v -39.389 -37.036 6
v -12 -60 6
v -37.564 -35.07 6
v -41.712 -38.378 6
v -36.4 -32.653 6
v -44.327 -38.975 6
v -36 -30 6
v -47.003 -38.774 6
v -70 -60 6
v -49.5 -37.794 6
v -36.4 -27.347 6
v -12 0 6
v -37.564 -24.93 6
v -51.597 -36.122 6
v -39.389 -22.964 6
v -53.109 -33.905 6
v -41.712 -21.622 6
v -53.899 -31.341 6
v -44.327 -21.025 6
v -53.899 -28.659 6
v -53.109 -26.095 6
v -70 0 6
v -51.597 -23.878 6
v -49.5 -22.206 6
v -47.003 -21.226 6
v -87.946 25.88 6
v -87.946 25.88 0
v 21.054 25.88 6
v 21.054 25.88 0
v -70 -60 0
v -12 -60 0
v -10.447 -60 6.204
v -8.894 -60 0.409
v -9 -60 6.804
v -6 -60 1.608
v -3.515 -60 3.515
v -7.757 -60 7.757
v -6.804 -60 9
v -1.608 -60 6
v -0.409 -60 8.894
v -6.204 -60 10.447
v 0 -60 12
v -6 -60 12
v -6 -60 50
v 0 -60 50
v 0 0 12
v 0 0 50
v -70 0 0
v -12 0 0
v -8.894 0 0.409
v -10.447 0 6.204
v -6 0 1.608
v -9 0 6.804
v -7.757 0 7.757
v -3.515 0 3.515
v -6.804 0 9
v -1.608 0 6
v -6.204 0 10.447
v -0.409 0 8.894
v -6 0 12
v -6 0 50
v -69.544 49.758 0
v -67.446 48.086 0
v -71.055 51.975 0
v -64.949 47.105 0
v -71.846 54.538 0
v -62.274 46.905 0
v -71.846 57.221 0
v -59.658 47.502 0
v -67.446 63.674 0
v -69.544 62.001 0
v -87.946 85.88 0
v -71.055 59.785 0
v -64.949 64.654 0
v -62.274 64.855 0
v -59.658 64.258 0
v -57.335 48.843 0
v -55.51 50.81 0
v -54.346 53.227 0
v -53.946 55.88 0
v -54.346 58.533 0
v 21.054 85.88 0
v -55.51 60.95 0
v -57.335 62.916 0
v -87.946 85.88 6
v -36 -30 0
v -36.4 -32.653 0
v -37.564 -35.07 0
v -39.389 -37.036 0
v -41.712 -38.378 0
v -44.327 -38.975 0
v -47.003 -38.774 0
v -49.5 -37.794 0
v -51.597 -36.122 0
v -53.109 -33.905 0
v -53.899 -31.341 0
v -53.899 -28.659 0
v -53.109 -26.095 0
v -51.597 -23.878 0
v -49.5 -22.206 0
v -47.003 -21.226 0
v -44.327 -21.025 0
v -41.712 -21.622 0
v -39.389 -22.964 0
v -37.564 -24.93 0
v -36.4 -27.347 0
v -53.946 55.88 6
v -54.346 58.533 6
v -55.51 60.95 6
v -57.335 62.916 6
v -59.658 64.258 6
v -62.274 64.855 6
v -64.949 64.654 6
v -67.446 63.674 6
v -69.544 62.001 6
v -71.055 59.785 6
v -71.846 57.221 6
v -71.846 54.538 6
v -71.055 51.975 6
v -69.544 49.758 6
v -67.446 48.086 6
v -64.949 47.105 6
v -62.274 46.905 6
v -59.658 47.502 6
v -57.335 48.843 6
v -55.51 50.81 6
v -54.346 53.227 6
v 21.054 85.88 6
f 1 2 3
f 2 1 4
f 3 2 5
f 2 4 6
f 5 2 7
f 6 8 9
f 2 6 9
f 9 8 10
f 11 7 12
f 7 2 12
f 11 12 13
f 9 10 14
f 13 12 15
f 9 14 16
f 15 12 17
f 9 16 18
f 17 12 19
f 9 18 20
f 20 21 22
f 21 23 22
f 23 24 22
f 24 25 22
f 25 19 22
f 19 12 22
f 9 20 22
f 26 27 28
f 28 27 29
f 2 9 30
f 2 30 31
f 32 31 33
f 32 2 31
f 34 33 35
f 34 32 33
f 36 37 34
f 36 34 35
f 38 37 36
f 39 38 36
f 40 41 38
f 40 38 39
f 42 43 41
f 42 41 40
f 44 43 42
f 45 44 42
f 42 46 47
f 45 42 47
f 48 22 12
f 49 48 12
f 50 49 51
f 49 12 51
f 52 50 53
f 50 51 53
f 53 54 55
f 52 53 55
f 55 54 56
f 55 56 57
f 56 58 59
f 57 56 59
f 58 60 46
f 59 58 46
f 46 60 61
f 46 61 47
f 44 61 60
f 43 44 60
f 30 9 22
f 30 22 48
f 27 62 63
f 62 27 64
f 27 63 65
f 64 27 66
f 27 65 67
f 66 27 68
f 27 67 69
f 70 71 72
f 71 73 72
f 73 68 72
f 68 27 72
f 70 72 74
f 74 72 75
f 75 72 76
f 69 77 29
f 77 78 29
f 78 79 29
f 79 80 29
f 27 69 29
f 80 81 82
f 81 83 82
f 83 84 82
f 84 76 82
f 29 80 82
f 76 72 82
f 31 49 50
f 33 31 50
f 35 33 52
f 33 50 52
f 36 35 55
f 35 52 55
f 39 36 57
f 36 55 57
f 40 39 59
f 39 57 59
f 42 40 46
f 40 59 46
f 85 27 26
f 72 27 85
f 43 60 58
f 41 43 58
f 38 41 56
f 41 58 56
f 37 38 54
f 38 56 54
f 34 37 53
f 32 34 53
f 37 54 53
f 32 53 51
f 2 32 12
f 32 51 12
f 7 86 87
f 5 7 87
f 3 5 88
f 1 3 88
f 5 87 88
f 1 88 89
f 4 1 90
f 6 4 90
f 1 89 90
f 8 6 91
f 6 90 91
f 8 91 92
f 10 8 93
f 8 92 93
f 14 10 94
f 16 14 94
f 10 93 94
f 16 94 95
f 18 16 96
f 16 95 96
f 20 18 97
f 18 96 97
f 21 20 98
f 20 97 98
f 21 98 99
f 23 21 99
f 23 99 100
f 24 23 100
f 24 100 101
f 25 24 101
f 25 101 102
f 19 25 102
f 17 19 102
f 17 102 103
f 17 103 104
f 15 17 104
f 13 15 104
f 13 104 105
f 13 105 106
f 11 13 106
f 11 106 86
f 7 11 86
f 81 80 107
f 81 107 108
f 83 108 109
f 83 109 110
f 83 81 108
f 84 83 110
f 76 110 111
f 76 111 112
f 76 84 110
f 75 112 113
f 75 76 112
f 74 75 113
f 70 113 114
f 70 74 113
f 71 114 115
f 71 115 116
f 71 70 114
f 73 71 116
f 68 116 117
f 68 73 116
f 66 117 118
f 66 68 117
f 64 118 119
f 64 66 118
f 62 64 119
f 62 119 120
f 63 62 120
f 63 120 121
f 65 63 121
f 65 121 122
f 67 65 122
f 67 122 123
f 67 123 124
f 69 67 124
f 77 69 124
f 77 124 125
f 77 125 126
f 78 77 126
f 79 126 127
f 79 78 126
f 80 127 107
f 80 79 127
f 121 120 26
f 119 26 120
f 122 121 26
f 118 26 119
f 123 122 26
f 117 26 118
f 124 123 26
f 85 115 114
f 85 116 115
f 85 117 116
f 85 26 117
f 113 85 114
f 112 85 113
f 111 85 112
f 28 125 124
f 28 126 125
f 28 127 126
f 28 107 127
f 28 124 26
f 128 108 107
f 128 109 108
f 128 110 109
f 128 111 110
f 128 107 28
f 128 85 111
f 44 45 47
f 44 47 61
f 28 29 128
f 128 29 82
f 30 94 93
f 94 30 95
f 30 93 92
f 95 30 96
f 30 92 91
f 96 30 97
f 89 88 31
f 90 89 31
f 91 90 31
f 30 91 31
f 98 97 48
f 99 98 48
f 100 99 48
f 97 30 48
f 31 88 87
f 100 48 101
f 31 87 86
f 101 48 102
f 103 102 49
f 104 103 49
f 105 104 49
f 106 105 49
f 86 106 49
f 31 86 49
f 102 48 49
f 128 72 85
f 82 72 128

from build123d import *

# Parameters (mm, degrees)
F1_DEPTH = 60
F2_R     = 9
F3_DEPTH = 25
F4_W     = 109
F4_H     = 60
F4_R     = 9
F5_DEPTH = 6


with BuildPart() as f1:
    # F0 (on Front) → F1 (new body)
    with BuildSketch(Plane.XZ):
        with BuildLine():
            Line((-70, 6), (-70, 0))
            Line((-70, 0), (-12, 0))
            ThreePointArc((-12, 0), (-3.514719, 3.514719), (0, 12))
            Line((0, 12), (0, 50))
            Line((0, 50), (-6, 50))
            Line((-6, 50), (-6, 12))
            ThreePointArc((-6, 12), (-7.757359, 7.757359), (-12, 6))
            Line((-12, 6), (-70, 6))
        make_face()
    extrude(amount=F1_DEPTH)

    # F2 (on face) → F3 (cut)
    with BuildSketch(Plane(origin=(0, 0, 0), x_dir=(1, 0, 0), z_dir=(0, 0, -1))):
        with Locations((-45, 30)):
            Circle(F2_R)
    extrude(amount=-F3_DEPTH, mode=Mode.SUBTRACT)


with BuildPart() as f5:
    # F4 (on Top) → F5 (new body)
    with BuildSketch(Plane.XY):
        with Locations((-33.446243, 55.879757)):
            Rectangle(F4_W, F4_H)
        with Locations((-62.946243, 55.879757)):
            Circle(F4_R, mode=Mode.SUBTRACT)
    extrude(amount=F5_DEPTH)


solid = Compound([f1.part, f5.part])
